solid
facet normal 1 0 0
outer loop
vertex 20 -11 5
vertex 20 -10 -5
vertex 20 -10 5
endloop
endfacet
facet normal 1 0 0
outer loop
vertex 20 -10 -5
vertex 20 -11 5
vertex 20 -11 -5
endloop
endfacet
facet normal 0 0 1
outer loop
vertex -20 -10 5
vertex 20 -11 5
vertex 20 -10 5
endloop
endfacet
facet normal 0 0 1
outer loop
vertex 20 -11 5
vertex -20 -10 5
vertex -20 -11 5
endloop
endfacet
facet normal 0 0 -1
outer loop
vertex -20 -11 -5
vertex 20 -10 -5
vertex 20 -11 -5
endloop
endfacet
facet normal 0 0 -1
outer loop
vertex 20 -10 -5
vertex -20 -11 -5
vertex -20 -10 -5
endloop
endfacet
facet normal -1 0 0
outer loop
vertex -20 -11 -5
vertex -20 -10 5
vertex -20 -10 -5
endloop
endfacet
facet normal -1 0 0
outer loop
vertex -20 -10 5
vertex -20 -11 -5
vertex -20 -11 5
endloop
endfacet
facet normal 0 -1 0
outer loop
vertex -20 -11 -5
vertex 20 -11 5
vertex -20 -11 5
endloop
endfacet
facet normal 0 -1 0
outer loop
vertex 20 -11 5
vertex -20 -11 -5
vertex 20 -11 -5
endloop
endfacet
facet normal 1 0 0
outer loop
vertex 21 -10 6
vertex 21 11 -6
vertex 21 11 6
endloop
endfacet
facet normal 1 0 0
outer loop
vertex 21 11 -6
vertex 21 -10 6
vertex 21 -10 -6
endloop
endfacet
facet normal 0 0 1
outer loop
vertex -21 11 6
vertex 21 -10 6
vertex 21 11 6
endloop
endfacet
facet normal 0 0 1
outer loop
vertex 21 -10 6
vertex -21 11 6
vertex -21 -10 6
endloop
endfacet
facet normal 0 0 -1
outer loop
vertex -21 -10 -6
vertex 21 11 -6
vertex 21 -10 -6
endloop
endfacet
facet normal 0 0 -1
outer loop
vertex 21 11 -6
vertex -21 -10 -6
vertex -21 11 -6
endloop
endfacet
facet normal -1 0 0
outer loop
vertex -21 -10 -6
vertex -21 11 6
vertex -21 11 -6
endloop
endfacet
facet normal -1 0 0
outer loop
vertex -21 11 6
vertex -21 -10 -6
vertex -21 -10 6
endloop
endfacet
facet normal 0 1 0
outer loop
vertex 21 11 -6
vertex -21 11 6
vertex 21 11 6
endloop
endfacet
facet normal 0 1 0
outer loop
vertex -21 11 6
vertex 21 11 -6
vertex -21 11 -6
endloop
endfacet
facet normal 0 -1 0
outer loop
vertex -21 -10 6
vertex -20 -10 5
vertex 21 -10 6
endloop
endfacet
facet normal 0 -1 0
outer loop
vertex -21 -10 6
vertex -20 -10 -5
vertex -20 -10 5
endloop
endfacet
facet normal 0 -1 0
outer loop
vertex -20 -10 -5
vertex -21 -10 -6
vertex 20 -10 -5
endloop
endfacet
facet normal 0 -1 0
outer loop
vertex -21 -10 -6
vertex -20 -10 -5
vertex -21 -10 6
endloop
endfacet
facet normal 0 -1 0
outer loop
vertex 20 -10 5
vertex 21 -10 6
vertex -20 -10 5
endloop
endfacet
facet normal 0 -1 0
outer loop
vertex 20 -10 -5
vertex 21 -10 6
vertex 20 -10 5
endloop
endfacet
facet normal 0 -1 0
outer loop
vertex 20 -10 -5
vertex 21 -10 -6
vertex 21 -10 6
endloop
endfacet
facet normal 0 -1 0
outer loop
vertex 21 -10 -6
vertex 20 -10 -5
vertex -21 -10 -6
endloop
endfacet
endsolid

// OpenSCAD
// Unit of length: Unit.MM
union()
{
   color(c = [1.0, 0.0, 0.0, 1.0])
   {
      translate(v = [0.0, -0.5, 0.0])
      {
         cube(size = [40.0, 21.0, 10.0], center = true);
      }
   }
   translate(v = [0.0, 0.5, 0.0])
   {
      cube(size = [42.0, 21.0, 12.0], center = true);
   }
}
